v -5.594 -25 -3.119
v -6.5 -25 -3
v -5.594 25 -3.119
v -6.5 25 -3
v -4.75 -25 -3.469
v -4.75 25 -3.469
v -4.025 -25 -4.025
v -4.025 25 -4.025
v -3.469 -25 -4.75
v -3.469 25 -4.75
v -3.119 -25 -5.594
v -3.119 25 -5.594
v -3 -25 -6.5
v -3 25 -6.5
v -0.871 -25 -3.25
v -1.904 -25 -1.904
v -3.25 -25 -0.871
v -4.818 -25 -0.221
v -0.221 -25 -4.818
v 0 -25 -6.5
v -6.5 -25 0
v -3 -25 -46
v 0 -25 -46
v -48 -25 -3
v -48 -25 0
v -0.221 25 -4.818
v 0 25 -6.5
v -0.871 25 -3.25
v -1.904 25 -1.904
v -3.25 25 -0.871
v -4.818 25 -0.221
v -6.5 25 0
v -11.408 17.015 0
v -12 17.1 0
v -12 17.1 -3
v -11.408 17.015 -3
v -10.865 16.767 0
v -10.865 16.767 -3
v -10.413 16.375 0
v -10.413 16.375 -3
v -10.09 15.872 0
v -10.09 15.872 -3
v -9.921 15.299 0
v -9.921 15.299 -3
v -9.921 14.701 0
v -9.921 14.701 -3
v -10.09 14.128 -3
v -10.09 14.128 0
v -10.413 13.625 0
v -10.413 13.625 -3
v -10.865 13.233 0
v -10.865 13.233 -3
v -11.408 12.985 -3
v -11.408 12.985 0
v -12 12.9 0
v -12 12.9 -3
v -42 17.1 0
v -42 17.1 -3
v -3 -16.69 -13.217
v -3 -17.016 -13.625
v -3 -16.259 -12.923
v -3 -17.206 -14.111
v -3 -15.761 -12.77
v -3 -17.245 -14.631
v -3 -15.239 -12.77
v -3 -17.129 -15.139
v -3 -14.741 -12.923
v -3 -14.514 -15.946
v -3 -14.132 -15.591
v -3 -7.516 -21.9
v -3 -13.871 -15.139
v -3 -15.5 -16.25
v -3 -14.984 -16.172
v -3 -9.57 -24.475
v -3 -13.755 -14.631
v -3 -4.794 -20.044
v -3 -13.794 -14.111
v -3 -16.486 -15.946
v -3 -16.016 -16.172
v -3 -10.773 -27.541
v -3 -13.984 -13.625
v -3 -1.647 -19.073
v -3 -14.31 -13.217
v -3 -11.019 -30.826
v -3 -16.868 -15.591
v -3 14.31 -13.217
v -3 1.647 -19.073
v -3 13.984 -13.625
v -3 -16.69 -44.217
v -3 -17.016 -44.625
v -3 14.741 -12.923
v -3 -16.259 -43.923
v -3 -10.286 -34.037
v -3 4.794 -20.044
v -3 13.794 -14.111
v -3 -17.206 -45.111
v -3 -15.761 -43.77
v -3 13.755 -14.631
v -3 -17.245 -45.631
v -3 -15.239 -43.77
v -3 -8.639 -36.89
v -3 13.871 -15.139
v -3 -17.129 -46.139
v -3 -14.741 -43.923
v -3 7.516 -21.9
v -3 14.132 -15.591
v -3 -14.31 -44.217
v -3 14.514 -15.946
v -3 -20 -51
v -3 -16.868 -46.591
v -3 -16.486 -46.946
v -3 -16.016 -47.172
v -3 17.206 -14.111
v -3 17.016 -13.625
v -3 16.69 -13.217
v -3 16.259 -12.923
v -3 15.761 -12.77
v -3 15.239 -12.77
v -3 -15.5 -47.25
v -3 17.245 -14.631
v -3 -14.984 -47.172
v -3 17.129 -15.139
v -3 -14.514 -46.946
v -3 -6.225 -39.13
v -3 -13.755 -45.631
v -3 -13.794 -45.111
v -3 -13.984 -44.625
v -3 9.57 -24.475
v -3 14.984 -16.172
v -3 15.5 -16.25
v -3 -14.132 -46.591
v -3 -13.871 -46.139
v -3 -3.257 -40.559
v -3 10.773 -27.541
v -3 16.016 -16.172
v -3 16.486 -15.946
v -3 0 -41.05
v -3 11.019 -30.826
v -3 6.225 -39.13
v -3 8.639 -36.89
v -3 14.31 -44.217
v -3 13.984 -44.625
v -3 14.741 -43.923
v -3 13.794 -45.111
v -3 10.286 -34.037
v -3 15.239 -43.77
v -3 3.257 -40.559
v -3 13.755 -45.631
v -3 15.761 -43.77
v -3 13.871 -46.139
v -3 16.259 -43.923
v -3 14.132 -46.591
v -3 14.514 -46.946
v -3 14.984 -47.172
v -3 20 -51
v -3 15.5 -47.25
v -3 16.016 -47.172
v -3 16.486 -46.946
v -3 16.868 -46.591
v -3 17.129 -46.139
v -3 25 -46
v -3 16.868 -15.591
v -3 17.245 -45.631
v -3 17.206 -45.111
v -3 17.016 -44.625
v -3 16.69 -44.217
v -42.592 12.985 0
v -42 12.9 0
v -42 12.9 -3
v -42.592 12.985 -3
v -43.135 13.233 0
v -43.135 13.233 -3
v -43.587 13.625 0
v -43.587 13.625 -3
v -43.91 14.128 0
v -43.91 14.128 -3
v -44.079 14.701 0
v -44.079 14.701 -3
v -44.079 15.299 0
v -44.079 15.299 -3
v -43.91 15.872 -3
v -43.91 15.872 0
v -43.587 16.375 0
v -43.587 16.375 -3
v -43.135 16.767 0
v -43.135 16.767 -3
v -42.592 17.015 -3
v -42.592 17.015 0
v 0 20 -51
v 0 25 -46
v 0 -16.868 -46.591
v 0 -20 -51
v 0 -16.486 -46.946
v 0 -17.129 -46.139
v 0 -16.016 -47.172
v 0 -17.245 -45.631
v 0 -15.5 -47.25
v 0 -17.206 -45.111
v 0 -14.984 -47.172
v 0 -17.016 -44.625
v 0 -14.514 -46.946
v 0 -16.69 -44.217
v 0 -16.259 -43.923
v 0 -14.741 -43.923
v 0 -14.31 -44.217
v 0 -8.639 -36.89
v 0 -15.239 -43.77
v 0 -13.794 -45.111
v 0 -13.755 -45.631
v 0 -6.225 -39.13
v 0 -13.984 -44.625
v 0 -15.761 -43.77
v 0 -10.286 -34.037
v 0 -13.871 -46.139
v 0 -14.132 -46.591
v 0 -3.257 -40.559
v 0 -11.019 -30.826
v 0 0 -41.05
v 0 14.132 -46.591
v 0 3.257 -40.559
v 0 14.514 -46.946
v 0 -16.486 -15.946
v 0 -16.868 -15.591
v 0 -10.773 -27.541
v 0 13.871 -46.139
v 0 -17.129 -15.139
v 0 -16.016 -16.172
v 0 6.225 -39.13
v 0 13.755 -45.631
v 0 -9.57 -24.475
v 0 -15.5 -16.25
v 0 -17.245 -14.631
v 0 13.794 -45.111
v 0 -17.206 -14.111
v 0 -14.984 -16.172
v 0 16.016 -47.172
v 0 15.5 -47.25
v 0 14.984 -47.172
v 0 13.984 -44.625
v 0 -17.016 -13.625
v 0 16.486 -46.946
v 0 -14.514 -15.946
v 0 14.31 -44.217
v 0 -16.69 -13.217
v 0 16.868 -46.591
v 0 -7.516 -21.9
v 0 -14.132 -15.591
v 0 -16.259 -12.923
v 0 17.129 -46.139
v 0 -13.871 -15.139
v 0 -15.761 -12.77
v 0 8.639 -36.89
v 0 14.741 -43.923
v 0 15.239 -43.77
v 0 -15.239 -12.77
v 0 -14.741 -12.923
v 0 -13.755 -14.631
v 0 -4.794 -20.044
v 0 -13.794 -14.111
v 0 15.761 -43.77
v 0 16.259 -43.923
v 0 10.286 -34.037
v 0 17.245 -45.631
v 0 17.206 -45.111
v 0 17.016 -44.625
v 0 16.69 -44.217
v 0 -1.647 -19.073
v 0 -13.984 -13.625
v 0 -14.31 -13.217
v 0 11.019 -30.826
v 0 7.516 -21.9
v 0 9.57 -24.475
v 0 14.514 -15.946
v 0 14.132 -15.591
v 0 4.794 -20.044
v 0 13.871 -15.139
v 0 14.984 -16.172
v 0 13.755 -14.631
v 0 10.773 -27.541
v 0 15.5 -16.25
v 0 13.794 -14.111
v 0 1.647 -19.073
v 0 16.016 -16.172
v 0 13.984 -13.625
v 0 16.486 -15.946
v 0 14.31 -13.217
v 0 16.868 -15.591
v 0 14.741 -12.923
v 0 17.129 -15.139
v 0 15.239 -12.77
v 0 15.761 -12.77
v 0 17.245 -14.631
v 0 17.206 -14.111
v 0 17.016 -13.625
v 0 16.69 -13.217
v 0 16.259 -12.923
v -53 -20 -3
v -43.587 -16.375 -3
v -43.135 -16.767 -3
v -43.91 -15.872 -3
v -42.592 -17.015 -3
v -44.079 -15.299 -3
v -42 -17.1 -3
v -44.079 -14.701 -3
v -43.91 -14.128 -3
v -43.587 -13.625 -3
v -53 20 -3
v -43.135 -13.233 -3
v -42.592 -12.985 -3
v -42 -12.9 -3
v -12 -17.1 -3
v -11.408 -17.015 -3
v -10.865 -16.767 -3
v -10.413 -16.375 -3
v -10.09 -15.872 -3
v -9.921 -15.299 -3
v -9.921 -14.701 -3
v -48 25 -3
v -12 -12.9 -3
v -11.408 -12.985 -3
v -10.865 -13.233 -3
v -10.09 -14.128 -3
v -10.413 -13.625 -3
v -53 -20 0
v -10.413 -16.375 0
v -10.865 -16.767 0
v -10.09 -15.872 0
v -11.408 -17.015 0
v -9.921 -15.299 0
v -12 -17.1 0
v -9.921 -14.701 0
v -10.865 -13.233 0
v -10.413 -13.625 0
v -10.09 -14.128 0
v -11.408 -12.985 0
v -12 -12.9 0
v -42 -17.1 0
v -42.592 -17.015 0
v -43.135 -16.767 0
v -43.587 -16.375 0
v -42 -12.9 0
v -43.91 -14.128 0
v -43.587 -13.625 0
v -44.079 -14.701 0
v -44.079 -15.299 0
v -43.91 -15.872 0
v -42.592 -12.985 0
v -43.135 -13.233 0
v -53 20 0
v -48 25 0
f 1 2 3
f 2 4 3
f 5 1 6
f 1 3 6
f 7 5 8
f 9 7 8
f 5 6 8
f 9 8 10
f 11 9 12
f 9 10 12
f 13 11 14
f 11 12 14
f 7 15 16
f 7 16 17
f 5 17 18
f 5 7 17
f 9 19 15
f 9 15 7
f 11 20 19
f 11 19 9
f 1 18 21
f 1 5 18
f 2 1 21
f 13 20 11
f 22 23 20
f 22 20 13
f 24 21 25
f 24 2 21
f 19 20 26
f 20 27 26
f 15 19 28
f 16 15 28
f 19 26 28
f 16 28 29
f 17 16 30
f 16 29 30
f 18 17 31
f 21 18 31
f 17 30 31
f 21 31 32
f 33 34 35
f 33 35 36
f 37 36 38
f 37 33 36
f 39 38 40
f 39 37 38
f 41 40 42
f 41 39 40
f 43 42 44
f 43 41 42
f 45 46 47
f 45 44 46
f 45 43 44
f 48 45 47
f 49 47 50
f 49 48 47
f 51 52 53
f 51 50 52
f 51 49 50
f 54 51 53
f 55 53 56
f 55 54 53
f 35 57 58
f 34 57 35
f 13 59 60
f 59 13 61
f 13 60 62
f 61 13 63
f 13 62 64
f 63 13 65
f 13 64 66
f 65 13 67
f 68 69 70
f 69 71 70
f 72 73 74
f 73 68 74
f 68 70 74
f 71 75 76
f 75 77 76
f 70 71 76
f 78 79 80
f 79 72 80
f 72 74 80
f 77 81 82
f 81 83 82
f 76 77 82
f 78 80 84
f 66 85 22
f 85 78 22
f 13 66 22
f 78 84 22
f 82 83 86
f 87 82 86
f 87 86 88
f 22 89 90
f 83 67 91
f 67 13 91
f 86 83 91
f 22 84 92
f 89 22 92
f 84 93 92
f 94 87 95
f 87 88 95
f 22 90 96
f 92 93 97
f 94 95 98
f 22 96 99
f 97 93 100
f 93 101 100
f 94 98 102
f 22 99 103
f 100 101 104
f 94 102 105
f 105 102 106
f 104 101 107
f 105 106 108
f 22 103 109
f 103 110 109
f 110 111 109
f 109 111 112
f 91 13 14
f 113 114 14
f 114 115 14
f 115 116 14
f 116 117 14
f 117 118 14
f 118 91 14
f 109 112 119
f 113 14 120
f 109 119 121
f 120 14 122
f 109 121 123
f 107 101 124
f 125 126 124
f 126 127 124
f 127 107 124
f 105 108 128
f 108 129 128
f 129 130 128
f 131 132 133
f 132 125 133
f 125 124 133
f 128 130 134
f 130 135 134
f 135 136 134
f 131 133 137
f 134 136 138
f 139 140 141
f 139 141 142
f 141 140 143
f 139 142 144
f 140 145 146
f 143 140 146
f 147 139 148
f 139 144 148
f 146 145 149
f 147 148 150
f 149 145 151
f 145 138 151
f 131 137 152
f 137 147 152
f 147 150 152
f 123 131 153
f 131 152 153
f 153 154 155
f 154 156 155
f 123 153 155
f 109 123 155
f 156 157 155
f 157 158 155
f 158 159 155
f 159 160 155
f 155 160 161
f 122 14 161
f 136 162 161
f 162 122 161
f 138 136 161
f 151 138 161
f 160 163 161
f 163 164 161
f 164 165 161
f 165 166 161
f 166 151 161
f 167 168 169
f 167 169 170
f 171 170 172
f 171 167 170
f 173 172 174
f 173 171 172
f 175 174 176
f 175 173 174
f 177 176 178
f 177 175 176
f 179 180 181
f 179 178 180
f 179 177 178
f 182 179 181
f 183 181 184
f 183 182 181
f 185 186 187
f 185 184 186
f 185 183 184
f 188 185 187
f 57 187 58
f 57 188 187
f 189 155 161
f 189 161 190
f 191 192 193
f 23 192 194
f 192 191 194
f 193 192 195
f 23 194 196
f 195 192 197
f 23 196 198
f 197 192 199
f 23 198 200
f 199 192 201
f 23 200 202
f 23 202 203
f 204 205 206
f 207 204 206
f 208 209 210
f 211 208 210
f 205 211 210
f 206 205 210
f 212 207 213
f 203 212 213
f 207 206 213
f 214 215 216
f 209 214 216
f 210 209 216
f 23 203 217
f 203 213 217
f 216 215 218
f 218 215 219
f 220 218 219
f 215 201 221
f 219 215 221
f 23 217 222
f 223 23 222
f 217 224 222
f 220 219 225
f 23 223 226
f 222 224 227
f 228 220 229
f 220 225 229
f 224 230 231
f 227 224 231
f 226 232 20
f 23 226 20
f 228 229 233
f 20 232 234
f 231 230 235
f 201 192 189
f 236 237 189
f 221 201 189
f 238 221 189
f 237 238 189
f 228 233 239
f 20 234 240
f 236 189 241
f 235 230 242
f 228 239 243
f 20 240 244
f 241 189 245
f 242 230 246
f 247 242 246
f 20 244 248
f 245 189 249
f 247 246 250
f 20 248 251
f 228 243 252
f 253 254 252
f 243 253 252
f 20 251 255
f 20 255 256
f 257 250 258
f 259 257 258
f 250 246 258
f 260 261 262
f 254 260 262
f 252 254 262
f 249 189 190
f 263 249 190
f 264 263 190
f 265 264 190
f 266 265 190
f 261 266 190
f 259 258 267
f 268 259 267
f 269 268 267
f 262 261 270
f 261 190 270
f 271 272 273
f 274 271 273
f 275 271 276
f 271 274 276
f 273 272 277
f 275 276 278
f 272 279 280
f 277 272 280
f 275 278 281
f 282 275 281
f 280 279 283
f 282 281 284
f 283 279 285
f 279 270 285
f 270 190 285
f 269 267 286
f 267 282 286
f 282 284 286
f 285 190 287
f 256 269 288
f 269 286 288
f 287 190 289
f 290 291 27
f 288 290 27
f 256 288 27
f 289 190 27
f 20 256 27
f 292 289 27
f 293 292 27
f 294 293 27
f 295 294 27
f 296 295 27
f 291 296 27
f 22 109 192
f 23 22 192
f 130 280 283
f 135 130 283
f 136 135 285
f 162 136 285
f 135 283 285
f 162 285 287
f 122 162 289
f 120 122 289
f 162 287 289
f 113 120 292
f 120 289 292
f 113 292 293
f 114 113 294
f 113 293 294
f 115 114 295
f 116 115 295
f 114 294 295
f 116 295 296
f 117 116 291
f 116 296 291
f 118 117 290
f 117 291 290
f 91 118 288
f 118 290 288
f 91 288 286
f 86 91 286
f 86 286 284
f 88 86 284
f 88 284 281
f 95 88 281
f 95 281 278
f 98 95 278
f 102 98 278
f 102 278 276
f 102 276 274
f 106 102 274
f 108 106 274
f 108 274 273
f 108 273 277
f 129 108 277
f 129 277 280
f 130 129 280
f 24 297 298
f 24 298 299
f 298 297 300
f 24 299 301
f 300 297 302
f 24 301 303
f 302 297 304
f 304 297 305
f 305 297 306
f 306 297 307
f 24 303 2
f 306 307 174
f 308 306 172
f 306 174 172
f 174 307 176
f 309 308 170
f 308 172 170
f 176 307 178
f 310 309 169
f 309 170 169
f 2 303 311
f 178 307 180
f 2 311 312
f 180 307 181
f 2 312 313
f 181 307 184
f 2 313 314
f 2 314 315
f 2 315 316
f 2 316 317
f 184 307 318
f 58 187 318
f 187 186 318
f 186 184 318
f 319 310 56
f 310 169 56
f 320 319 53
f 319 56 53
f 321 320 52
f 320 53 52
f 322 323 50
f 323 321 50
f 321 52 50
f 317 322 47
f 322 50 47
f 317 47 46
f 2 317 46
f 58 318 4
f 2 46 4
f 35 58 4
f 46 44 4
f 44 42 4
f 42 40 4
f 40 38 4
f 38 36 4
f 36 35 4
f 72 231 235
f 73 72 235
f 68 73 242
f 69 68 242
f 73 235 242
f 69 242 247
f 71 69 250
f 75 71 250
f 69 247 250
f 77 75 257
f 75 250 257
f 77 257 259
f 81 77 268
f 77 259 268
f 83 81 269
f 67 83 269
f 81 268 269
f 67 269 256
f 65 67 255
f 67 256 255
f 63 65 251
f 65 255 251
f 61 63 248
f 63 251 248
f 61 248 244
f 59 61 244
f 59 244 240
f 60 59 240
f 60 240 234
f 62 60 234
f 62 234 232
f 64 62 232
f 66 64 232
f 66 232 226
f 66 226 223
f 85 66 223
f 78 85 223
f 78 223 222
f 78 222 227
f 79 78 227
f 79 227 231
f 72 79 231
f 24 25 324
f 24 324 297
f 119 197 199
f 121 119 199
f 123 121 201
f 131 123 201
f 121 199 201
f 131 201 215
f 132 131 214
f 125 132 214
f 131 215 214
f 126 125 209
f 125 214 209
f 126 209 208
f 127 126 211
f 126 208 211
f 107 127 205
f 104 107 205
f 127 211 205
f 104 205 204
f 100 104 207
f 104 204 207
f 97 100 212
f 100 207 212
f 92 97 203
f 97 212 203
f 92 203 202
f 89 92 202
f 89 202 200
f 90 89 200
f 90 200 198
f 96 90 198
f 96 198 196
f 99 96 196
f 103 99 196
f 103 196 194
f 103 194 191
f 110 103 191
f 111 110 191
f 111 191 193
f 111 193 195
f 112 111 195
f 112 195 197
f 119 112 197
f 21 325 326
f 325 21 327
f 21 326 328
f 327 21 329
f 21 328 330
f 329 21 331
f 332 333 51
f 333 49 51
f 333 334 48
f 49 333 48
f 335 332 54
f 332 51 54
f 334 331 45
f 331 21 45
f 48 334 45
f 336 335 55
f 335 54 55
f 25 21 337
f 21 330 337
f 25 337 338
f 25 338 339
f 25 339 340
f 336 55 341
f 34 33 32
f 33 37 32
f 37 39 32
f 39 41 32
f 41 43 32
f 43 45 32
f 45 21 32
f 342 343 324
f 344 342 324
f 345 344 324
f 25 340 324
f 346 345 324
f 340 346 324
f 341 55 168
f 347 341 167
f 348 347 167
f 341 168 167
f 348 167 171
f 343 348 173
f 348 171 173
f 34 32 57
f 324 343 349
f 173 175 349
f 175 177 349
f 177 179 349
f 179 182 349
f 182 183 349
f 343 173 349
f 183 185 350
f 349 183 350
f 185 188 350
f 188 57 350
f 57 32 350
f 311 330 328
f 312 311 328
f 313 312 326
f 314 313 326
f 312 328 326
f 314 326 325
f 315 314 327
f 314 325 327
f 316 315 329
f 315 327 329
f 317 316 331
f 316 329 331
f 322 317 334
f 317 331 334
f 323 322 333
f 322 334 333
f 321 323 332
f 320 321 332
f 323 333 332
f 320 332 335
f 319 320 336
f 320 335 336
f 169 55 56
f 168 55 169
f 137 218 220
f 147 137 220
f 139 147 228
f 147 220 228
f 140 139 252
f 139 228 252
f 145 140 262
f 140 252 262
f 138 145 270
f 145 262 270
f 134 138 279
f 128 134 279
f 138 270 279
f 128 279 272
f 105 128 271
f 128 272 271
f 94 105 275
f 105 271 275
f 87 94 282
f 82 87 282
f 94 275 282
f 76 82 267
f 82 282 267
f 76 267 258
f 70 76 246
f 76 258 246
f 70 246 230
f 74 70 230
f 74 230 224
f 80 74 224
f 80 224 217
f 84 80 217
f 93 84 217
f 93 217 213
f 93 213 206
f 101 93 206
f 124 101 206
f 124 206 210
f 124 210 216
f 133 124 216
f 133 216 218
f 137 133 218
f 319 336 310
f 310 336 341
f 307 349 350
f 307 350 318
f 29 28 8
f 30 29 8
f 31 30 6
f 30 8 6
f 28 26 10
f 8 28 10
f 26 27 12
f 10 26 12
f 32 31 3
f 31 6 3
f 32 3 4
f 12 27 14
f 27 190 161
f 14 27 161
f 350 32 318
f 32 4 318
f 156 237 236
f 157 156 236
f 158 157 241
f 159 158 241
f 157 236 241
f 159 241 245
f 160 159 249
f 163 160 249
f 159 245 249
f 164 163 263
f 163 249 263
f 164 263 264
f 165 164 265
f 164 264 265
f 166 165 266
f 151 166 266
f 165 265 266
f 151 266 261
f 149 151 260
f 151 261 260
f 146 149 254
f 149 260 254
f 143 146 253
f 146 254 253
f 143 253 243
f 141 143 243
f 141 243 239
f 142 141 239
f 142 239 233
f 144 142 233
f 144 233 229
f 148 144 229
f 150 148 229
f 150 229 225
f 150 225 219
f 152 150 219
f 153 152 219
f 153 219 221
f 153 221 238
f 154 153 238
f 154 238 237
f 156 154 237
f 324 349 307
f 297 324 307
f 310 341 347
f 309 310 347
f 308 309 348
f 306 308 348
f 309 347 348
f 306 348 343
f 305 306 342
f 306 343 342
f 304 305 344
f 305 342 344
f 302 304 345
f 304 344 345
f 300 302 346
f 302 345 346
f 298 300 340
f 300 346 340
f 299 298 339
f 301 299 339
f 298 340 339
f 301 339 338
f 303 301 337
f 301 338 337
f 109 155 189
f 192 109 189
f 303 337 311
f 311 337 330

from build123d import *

# Parameters (mm, degrees)
BASE_FLANGE1_DEPTH = 25
CHAMFER1_SIZE      = 5
SKETCH7_R          = 11.05
SKETCH7_R_2        = 1.75
CUT_EXTRUDE1_DEPTH = 78.685262438
CUT_EXTRUDE2_DEPTH = 78.685262438


# Sheet-metal steps are written as plain solids
with BuildPart() as part:
    # Sketch2 → Base-Flange1 (new, symmetric)
    with BuildSketch(Plane(origin=(0, 0, 0), x_dir=(1, 0, 0), z_dir=(0, 1, 0))):
        with BuildLine():
            Line((0, 51), (0, 6.5))
            ThreePointArc((0, 6.5), (-1.903805922, 1.903805922), (-6.5, 0))
            Line((-6.5, 0), (-53, 0))
            Line((-53, 0), (-53, 3))
            Line((-53, 3), (-6.5, 3))
            ThreePointArc((-6.5, 3), (-4.025126266, 4.025126266), (-3, 6.5))
            Line((-3, 6.5), (-3, 51))
            Line((-3, 51), (0, 51))
        make_face()
    extrude(amount=BASE_FLANGE1_DEPTH, both=True)

    # Chamfer1
    chamfer1_edges = [part.edges().sort_by_distance(p)[0] for p in [
        (-1.5, 25, -51),
        (-53, 25, -1.5),
        (-1.5, -25, -51),
        (-53, -25, -1.5),
    ]]
    chamfer(chamfer1_edges, length=CHAMFER1_SIZE)

    # Sketch7 → Cut-Extrude1 (cut, through all)
    with BuildSketch(Plane(origin=(0, 0, 0), x_dir=(0, 0, -1), z_dir=(1, 0, 0))):
        with Locations((30, 0)):
            Circle(SKETCH7_R)
        with Locations((45.5, 15.5)):
            Circle(SKETCH7_R_2)
        with Locations((14.5, 15.5)):
            Circle(SKETCH7_R_2)
        with Locations((14.5, -15.5)):
            Circle(SKETCH7_R_2)
        with Locations((45.5, -15.5)):
            Circle(SKETCH7_R_2)
    extrude(amount=-CUT_EXTRUDE1_DEPTH, mode=Mode.SUBTRACT)

    # Sketch8 → Cut-Extrude2 (cut, through all)
    with BuildSketch(Plane.XY):
        with BuildLine():
            Line((-42, 17.1), (-12, 17.1))
            ThreePointArc((-12, 17.1), (-9.9, 15), (-12, 12.9))
            Line((-12, 12.9), (-42, 12.9))
            ThreePointArc((-42, 12.9), (-44.1, 15), (-42, 17.1))
        make_face()
        with BuildLine():
            Line((-42, -17.1), (-12, -17.1))
            ThreePointArc((-12, -17.1), (-9.9, -15), (-12, -12.9))
            Line((-12, -12.9), (-42, -12.9))
            ThreePointArc((-42, -12.9), (-44.1, -15), (-42, -17.1))
        make_face()
    extrude(amount=-CUT_EXTRUDE2_DEPTH, mode=Mode.SUBTRACT)


solid = part.part
